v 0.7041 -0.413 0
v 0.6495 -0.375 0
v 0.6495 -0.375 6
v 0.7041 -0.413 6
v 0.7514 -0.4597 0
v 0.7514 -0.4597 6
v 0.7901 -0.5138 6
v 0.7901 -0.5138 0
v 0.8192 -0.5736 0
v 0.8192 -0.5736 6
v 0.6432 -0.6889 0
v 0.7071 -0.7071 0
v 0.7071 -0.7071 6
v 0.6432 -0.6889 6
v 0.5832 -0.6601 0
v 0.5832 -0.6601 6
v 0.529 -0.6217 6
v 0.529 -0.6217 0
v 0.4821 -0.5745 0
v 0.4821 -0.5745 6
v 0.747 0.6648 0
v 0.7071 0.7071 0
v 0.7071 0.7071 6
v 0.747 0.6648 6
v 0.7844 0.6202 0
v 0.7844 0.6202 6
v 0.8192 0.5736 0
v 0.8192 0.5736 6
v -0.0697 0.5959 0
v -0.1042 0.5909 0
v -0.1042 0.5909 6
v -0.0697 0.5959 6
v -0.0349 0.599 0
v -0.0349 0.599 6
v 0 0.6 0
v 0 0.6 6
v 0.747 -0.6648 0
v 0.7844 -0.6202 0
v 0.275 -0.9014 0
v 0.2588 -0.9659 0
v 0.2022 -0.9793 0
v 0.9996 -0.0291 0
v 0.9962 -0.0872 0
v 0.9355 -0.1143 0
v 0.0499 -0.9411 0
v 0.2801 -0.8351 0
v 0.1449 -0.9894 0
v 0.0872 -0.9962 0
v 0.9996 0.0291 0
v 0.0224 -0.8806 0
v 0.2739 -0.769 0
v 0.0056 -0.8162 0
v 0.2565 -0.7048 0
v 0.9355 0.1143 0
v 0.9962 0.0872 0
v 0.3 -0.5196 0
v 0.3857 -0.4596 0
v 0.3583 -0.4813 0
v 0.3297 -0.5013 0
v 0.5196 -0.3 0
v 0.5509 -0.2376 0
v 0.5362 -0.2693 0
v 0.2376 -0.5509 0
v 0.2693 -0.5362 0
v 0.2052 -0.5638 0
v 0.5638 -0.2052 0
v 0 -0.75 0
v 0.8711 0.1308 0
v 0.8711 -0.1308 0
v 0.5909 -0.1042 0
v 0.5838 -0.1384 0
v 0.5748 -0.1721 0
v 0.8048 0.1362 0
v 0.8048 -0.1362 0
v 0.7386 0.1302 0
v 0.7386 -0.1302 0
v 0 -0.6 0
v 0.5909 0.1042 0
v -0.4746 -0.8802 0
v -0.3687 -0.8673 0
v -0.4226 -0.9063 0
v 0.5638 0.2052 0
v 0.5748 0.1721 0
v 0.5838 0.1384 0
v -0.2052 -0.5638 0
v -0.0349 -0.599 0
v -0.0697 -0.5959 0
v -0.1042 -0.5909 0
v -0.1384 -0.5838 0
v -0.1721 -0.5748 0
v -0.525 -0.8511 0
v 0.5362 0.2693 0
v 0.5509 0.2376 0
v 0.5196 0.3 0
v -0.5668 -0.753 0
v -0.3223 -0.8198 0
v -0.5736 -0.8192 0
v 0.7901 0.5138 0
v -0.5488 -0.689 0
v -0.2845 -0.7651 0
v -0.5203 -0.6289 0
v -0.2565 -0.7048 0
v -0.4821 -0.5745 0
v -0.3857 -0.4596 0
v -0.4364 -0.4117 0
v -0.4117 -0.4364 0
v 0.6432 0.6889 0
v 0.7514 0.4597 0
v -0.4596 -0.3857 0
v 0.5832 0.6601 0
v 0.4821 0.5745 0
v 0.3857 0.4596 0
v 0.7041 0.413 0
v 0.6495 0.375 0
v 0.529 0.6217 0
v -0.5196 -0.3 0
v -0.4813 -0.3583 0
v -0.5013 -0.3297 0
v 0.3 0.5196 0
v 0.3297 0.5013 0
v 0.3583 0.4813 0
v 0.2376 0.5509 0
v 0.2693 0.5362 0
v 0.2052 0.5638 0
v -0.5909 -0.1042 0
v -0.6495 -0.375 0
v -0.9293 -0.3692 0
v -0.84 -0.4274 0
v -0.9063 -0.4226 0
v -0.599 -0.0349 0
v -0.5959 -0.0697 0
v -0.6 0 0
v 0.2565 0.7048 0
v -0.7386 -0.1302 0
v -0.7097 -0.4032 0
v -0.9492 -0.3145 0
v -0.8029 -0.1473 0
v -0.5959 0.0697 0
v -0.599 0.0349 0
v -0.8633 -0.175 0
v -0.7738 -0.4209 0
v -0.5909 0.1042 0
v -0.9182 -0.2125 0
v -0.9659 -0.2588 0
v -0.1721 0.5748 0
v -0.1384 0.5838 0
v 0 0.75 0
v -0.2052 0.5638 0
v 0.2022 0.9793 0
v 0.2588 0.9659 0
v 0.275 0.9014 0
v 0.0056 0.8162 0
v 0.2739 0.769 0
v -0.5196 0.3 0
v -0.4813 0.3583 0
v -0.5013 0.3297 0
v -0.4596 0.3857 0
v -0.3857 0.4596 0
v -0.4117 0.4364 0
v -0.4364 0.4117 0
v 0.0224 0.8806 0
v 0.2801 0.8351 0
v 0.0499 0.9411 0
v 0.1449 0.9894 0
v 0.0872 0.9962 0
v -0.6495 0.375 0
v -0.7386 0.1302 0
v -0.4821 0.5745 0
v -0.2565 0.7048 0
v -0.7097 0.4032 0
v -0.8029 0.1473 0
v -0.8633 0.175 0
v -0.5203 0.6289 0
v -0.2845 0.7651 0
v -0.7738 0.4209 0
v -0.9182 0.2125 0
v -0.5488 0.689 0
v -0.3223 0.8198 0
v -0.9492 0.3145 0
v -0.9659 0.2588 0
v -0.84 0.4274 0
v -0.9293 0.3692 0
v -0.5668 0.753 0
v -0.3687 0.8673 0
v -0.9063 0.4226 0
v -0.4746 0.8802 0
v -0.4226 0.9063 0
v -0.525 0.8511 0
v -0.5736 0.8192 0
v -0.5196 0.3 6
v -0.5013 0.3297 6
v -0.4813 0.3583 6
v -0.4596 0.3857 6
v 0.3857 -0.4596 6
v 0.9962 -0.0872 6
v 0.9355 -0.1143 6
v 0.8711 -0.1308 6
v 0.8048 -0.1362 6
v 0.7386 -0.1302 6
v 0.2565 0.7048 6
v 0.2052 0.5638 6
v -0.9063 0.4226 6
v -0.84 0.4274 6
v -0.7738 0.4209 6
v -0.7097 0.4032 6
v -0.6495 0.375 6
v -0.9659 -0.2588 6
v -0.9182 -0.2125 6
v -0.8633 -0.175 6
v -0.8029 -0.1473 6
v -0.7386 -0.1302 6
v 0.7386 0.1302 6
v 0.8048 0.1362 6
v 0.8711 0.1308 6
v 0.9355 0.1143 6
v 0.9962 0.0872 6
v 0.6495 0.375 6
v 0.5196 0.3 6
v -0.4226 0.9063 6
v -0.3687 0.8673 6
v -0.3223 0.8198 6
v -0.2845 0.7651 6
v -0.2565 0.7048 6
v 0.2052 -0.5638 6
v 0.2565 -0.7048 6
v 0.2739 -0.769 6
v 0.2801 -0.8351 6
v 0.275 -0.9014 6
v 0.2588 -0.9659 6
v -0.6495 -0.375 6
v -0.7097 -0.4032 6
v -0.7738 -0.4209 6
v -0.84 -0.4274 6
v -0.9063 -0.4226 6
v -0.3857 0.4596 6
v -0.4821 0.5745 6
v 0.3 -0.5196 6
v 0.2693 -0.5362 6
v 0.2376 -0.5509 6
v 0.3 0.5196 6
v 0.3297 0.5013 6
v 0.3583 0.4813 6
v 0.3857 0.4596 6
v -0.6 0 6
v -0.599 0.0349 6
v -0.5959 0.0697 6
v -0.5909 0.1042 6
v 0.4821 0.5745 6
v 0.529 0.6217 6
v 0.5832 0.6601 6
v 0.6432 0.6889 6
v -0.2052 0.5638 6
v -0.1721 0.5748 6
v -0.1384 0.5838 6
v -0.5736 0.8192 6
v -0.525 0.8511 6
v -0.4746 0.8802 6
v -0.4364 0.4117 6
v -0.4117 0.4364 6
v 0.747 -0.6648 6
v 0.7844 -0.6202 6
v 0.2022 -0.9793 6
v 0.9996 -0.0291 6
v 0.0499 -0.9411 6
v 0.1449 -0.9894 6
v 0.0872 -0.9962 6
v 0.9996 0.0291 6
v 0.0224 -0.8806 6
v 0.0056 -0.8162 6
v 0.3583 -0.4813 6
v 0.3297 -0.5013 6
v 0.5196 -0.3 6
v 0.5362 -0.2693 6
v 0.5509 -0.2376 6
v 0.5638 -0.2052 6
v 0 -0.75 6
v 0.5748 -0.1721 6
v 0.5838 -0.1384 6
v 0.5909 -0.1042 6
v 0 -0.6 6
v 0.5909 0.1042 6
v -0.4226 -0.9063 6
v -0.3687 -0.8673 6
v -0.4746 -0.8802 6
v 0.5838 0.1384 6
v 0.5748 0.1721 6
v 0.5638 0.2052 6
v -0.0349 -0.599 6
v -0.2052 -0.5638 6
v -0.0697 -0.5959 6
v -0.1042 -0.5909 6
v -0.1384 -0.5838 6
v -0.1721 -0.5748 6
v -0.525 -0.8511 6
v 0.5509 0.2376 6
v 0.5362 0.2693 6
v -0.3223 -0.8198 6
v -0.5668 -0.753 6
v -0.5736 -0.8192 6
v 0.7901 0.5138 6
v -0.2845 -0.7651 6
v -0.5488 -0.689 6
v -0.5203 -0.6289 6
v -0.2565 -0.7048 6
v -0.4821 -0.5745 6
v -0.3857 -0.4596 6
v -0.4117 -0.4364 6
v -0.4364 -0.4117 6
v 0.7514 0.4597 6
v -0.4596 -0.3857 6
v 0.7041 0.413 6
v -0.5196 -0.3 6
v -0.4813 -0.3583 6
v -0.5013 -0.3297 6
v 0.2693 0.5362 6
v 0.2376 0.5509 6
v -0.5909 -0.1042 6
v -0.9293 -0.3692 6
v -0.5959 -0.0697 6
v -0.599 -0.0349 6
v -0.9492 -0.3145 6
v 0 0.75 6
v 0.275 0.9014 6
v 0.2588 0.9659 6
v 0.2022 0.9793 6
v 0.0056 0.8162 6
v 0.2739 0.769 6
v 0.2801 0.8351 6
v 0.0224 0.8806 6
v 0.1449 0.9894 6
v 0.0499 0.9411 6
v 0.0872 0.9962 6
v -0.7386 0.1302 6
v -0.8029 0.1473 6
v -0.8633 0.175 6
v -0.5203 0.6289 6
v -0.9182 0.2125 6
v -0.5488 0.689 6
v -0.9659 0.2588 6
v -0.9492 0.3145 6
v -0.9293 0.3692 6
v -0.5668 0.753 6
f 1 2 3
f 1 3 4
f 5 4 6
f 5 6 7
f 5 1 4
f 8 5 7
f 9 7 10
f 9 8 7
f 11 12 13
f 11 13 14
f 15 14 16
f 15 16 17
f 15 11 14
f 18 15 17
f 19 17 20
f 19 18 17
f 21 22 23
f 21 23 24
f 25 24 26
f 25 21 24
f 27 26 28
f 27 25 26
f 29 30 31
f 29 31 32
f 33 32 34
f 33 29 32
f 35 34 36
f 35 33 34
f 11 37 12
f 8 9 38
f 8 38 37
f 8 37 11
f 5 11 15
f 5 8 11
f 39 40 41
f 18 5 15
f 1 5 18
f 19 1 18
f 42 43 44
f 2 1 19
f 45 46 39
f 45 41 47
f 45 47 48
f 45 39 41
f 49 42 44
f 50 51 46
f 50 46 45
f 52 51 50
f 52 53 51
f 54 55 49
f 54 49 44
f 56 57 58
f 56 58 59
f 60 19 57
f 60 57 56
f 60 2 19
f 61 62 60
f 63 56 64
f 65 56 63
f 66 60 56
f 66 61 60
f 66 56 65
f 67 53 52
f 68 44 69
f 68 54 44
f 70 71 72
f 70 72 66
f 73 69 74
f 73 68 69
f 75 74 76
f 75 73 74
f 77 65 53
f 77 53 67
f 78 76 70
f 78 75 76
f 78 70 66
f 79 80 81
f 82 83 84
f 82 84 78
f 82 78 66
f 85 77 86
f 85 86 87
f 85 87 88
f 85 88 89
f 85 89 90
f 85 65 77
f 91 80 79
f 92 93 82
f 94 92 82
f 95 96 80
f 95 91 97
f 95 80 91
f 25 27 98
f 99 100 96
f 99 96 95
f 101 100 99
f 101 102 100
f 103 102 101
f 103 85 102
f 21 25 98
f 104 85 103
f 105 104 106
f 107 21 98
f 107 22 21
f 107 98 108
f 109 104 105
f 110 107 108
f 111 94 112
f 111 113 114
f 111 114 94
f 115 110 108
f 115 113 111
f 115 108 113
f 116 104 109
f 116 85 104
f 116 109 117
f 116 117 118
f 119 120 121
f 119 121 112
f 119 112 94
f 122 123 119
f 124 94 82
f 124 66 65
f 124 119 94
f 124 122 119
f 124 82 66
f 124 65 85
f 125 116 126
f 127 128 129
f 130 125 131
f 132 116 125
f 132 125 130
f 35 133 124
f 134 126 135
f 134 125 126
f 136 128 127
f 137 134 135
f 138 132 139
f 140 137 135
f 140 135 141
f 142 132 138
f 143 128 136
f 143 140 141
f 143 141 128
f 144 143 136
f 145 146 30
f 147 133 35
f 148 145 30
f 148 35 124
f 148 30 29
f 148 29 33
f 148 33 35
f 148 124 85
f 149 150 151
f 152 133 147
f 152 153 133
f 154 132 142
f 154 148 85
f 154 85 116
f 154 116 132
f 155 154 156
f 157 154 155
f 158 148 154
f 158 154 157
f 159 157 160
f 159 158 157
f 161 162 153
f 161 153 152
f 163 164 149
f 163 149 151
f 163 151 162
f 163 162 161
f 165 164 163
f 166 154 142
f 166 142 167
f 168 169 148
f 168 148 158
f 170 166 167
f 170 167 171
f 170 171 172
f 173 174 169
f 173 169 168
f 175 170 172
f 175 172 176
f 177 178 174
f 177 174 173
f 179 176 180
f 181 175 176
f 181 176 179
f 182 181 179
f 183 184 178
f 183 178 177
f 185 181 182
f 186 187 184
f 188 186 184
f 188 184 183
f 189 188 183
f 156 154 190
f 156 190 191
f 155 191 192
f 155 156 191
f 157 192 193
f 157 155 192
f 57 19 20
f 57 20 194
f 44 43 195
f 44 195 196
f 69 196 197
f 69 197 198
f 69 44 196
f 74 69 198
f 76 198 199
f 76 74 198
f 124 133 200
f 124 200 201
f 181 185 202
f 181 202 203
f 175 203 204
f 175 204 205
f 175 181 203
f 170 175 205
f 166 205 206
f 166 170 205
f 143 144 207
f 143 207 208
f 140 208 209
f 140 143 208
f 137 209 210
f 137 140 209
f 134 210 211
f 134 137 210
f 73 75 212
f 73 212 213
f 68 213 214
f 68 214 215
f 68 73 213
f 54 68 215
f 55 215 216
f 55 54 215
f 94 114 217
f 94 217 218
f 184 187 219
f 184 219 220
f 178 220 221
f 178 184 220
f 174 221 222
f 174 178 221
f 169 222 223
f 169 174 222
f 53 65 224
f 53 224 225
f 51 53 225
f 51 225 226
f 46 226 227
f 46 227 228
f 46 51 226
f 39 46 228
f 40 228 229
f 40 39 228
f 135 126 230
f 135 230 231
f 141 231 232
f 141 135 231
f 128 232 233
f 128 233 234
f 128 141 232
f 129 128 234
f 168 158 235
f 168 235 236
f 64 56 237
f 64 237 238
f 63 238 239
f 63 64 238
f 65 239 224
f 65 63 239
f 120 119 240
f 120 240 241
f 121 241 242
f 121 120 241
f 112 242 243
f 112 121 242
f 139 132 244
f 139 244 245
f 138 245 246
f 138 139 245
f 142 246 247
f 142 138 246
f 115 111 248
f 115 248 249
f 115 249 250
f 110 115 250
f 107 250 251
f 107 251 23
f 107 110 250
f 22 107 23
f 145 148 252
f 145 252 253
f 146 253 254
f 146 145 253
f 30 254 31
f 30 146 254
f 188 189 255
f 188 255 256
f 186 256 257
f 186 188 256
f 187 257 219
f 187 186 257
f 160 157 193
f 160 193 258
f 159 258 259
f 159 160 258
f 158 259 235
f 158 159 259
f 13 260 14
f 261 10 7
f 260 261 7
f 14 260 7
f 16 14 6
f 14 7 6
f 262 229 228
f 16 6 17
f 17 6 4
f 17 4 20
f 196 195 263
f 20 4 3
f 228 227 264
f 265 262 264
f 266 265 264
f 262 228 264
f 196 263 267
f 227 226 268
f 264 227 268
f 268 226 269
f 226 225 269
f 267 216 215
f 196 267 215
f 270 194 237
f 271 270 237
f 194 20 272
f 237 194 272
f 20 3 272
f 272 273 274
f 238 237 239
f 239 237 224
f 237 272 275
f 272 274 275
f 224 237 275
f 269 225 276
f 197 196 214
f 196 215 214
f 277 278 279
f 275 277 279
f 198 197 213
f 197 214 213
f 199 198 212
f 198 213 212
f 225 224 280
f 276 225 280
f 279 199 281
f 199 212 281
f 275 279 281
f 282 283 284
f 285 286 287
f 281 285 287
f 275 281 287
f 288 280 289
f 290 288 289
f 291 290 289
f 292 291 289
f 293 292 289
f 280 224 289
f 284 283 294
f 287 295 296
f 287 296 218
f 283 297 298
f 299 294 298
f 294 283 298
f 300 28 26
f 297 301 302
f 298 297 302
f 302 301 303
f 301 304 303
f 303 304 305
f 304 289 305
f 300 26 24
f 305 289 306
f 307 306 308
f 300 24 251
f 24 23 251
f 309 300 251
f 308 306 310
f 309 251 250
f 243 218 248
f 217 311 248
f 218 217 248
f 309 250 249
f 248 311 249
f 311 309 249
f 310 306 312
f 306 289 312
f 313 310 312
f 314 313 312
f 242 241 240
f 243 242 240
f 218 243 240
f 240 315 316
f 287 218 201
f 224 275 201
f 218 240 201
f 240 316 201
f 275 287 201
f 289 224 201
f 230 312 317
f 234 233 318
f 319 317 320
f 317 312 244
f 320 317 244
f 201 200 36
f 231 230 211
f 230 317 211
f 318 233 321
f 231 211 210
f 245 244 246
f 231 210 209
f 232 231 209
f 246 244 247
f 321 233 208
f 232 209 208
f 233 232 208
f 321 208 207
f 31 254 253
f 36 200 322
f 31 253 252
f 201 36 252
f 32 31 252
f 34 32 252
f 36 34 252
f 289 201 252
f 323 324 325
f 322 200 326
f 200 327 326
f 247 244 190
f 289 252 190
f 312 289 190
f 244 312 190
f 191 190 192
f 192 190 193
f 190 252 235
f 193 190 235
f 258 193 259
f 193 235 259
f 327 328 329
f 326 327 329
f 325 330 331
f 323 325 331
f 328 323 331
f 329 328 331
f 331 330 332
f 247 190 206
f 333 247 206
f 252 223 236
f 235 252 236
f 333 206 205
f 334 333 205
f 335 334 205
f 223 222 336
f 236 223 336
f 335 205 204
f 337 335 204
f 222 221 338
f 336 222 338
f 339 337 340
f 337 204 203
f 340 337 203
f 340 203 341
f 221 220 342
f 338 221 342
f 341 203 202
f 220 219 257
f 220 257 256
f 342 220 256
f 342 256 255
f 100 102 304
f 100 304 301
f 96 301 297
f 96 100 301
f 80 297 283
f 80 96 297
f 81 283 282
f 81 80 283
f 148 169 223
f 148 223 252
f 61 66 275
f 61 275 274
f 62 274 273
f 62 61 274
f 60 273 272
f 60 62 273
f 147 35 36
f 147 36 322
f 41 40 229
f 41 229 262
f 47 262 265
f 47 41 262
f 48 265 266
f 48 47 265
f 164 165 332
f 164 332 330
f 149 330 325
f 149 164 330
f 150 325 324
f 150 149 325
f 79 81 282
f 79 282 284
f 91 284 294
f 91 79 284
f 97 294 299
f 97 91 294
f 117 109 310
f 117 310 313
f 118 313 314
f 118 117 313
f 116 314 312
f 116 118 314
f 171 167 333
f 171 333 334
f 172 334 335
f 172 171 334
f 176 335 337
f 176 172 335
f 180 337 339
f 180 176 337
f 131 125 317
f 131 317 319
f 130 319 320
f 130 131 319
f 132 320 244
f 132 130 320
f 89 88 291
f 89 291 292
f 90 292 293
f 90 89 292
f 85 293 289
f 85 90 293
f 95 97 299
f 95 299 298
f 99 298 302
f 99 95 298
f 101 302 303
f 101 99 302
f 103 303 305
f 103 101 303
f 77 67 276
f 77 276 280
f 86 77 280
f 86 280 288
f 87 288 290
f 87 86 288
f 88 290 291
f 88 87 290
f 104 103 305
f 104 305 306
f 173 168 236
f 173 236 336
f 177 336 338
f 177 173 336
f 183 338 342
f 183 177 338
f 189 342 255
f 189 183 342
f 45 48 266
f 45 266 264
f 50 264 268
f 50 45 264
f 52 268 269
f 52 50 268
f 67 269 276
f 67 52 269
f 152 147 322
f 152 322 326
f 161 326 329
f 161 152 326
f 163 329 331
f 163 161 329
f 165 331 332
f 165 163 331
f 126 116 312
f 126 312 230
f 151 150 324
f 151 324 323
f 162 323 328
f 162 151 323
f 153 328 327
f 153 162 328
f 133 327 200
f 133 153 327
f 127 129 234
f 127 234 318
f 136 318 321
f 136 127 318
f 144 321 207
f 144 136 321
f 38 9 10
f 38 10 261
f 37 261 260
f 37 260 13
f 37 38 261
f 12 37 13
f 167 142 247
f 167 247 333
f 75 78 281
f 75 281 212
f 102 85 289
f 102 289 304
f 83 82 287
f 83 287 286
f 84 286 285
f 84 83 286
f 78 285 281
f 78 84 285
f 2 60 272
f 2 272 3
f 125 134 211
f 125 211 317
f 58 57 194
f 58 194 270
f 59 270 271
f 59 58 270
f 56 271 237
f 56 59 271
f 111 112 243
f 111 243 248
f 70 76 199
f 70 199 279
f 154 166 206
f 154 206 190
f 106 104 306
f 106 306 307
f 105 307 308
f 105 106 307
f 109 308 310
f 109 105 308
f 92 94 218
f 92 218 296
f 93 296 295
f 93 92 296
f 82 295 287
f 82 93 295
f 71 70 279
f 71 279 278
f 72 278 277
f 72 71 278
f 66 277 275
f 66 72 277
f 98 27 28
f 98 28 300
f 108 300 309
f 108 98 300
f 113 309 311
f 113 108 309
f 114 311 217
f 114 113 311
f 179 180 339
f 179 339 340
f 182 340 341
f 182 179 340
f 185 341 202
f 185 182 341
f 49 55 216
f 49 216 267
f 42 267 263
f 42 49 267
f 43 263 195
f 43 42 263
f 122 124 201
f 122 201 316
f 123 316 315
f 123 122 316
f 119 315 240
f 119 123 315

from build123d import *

# Parameters (mm, degrees)
BOSS_EXTRUDE1_DEPTH = 6


with BuildPart() as part:
    # Sketch1 → Boss-Extrude1 (new body)
    with BuildSketch(Plane.XY):
        with BuildLine():
            Line((0.590884652, 0.104188907), (0.738605815, 0.130236133))
            ThreePointArc((0.738605815, 0.130236133), (0.871100483, 0.13082056), (0.996194698, 0.087155743))
            ThreePointArc((0.996194698, 0.087155743), (1, 0), (0.996194698, -0.087155743))
            ThreePointArc((0.996194698, -0.087155743), (0.871100483, -0.13082056), (0.738605815, -0.130236133))
            Line((0.738605815, -0.130236133), (0.590884652, -0.104188907))
            ThreePointArc((0.590884652, -0.104188907), (0.579555496, -0.155291427), (0.563815572, -0.205212086))
            ThreePointArc((0.563815572, -0.205212086), (0.543784672, -0.253570957), (0.519615242, -0.3))
            Line((0.519615242, -0.3), (0.649519053, -0.375))
            ThreePointArc((0.649519053, -0.375), (0.75139152, -0.459718235), (0.819152044, -0.573576436))
            ThreePointArc((0.819152044, -0.573576436), (0.766044443, -0.64278761), (0.707106781, -0.707106781))
            ThreePointArc((0.707106781, -0.707106781), (0.58321185, -0.660146961), (0.482090707, -0.574533332))
            Line((0.482090707, -0.574533332), (0.385672566, -0.459626666))
            ThreePointArc((0.385672566, -0.459626666), (0.344145862, -0.491491227), (0.3, -0.519615242))
            ThreePointArc((0.3, -0.519615242), (0.253570957, -0.543784672), (0.205212086, -0.563815572))
            Line((0.205212086, -0.563815572), (0.256515107, -0.704769466))
            ThreePointArc((0.256515107, -0.704769466), (0.280098113, -0.835149758), (0.258819045, -0.965925826))
            ThreePointArc((0.258819045, -0.965925826), (0.173648178, -0.984807753), (0.087155743, -0.996194698))
            ThreePointArc((0.087155743, -0.996194698), (0.02243191, -0.880583262), (0, -0.75))
            Line((0, -0.75), (0, -0.6))
            ThreePointArc((0, -0.6), (-0.052293446, -0.597716819), (-0.104188907, -0.590884652))
            ThreePointArc((-0.104188907, -0.590884652), (-0.155291427, -0.579555496), (-0.205212086, -0.563815572))
            Line((-0.205212086, -0.563815572), (-0.256515107, -0.704769466))
            ThreePointArc((-0.256515107, -0.704769466), (-0.322256313, -0.819805428), (-0.422618262, -0.906307787))
            ThreePointArc((-0.422618262, -0.906307787), (-0.5, -0.866025404), (-0.573576436, -0.819152044))
            ThreePointArc((-0.573576436, -0.819152044), (-0.54884417, -0.688984868), (-0.482090707, -0.574533332))
            Line((-0.482090707, -0.574533332), (-0.385672566, -0.459626666))
            ThreePointArc((-0.385672566, -0.459626666), (-0.424264069, -0.424264069), (-0.459626666, -0.385672566))
            ThreePointArc((-0.459626666, -0.385672566), (-0.491491227, -0.344145862), (-0.519615242, -0.3))
            Line((-0.519615242, -0.3), (-0.649519053, -0.375))
            ThreePointArc((-0.649519053, -0.375), (-0.77382343, -0.420865027), (-0.906307787, -0.422618262))
            ThreePointArc((-0.906307787, -0.422618262), (-0.939692621, -0.342020143), (-0.965925826, -0.258819045))
            ThreePointArc((-0.965925826, -0.258819045), (-0.863309963, -0.175002797), (-0.738605815, -0.130236133))
            Line((-0.738605815, -0.130236133), (-0.590884652, -0.104188907))
            ThreePointArc((-0.590884652, -0.104188907), (-0.597716819, -0.052293446), (-0.6, 0))
            ThreePointArc((-0.6, 0), (-0.597716819, 0.052293446), (-0.590884652, 0.104188907))
            Line((-0.590884652, 0.104188907), (-0.738605815, 0.130236133))
            ThreePointArc((-0.738605815, 0.130236133), (-0.863309963, 0.175002797), (-0.965925826, 0.258819045))
            ThreePointArc((-0.965925826, 0.258819045), (-0.939692621, 0.342020143), (-0.906307787, 0.422618262))
            ThreePointArc((-0.906307787, 0.422618262), (-0.77382343, 0.420865027), (-0.649519053, 0.375))
            Line((-0.649519053, 0.375), (-0.519615242, 0.3))
            ThreePointArc((-0.519615242, 0.3), (-0.491491227, 0.344145862), (-0.459626666, 0.385672566))
            ThreePointArc((-0.459626666, 0.385672566), (-0.424264069, 0.424264069), (-0.385672566, 0.459626666))
            Line((-0.385672566, 0.459626666), (-0.482090707, 0.574533332))
            ThreePointArc((-0.482090707, 0.574533332), (-0.54884417, 0.688984868), (-0.573576436, 0.819152044))
            ThreePointArc((-0.573576436, 0.819152044), (-0.5, 0.866025404), (-0.422618262, 0.906307787))
            ThreePointArc((-0.422618262, 0.906307787), (-0.322256313, 0.819805428), (-0.256515107, 0.704769466))
            Line((-0.256515107, 0.704769466), (-0.205212086, 0.563815572))
            ThreePointArc((-0.205212086, 0.563815572), (-0.155291427, 0.579555496), (-0.104188907, 0.590884652))
            ThreePointArc((-0.104188907, 0.590884652), (-0.052293446, 0.597716819), (0, 0.6))
            Line((0, 0.6), (0, 0.75))
            ThreePointArc((0, 0.75), (0.02243191, 0.880583262), (0.087155743, 0.996194698))
            ThreePointArc((0.087155743, 0.996194698), (0.173648178, 0.984807753), (0.258819045, 0.965925826))
            ThreePointArc((0.258819045, 0.965925826), (0.280098113, 0.835149758), (0.256515107, 0.704769466))
            Line((0.256515107, 0.704769466), (0.205212086, 0.563815572))
            ThreePointArc((0.205212086, 0.563815572), (0.253570957, 0.543784672), (0.3, 0.519615242))
            ThreePointArc((0.3, 0.519615242), (0.344145862, 0.491491227), (0.385672566, 0.459626666))
            Line((0.385672566, 0.459626666), (0.482090707, 0.574533332))
            ThreePointArc((0.482090707, 0.574533332), (0.58321185, 0.660146961), (0.707106781, 0.707106781))
            ThreePointArc((0.707106781, 0.707106781), (0.766044443, 0.64278761), (0.819152044, 0.573576436))
            ThreePointArc((0.819152044, 0.573576436), (0.75139152, 0.459718235), (0.649519053, 0.375))
            Line((0.649519053, 0.375), (0.519615242, 0.3))
            ThreePointArc((0.519615242, 0.3), (0.543784672, 0.253570957), (0.563815572, 0.205212086))
            ThreePointArc((0.563815572, 0.205212086), (0.579555496, 0.155291427), (0.590884652, 0.104188907))
        make_face()
    extrude(amount=BOSS_EXTRUDE1_DEPTH)


solid = part.part
